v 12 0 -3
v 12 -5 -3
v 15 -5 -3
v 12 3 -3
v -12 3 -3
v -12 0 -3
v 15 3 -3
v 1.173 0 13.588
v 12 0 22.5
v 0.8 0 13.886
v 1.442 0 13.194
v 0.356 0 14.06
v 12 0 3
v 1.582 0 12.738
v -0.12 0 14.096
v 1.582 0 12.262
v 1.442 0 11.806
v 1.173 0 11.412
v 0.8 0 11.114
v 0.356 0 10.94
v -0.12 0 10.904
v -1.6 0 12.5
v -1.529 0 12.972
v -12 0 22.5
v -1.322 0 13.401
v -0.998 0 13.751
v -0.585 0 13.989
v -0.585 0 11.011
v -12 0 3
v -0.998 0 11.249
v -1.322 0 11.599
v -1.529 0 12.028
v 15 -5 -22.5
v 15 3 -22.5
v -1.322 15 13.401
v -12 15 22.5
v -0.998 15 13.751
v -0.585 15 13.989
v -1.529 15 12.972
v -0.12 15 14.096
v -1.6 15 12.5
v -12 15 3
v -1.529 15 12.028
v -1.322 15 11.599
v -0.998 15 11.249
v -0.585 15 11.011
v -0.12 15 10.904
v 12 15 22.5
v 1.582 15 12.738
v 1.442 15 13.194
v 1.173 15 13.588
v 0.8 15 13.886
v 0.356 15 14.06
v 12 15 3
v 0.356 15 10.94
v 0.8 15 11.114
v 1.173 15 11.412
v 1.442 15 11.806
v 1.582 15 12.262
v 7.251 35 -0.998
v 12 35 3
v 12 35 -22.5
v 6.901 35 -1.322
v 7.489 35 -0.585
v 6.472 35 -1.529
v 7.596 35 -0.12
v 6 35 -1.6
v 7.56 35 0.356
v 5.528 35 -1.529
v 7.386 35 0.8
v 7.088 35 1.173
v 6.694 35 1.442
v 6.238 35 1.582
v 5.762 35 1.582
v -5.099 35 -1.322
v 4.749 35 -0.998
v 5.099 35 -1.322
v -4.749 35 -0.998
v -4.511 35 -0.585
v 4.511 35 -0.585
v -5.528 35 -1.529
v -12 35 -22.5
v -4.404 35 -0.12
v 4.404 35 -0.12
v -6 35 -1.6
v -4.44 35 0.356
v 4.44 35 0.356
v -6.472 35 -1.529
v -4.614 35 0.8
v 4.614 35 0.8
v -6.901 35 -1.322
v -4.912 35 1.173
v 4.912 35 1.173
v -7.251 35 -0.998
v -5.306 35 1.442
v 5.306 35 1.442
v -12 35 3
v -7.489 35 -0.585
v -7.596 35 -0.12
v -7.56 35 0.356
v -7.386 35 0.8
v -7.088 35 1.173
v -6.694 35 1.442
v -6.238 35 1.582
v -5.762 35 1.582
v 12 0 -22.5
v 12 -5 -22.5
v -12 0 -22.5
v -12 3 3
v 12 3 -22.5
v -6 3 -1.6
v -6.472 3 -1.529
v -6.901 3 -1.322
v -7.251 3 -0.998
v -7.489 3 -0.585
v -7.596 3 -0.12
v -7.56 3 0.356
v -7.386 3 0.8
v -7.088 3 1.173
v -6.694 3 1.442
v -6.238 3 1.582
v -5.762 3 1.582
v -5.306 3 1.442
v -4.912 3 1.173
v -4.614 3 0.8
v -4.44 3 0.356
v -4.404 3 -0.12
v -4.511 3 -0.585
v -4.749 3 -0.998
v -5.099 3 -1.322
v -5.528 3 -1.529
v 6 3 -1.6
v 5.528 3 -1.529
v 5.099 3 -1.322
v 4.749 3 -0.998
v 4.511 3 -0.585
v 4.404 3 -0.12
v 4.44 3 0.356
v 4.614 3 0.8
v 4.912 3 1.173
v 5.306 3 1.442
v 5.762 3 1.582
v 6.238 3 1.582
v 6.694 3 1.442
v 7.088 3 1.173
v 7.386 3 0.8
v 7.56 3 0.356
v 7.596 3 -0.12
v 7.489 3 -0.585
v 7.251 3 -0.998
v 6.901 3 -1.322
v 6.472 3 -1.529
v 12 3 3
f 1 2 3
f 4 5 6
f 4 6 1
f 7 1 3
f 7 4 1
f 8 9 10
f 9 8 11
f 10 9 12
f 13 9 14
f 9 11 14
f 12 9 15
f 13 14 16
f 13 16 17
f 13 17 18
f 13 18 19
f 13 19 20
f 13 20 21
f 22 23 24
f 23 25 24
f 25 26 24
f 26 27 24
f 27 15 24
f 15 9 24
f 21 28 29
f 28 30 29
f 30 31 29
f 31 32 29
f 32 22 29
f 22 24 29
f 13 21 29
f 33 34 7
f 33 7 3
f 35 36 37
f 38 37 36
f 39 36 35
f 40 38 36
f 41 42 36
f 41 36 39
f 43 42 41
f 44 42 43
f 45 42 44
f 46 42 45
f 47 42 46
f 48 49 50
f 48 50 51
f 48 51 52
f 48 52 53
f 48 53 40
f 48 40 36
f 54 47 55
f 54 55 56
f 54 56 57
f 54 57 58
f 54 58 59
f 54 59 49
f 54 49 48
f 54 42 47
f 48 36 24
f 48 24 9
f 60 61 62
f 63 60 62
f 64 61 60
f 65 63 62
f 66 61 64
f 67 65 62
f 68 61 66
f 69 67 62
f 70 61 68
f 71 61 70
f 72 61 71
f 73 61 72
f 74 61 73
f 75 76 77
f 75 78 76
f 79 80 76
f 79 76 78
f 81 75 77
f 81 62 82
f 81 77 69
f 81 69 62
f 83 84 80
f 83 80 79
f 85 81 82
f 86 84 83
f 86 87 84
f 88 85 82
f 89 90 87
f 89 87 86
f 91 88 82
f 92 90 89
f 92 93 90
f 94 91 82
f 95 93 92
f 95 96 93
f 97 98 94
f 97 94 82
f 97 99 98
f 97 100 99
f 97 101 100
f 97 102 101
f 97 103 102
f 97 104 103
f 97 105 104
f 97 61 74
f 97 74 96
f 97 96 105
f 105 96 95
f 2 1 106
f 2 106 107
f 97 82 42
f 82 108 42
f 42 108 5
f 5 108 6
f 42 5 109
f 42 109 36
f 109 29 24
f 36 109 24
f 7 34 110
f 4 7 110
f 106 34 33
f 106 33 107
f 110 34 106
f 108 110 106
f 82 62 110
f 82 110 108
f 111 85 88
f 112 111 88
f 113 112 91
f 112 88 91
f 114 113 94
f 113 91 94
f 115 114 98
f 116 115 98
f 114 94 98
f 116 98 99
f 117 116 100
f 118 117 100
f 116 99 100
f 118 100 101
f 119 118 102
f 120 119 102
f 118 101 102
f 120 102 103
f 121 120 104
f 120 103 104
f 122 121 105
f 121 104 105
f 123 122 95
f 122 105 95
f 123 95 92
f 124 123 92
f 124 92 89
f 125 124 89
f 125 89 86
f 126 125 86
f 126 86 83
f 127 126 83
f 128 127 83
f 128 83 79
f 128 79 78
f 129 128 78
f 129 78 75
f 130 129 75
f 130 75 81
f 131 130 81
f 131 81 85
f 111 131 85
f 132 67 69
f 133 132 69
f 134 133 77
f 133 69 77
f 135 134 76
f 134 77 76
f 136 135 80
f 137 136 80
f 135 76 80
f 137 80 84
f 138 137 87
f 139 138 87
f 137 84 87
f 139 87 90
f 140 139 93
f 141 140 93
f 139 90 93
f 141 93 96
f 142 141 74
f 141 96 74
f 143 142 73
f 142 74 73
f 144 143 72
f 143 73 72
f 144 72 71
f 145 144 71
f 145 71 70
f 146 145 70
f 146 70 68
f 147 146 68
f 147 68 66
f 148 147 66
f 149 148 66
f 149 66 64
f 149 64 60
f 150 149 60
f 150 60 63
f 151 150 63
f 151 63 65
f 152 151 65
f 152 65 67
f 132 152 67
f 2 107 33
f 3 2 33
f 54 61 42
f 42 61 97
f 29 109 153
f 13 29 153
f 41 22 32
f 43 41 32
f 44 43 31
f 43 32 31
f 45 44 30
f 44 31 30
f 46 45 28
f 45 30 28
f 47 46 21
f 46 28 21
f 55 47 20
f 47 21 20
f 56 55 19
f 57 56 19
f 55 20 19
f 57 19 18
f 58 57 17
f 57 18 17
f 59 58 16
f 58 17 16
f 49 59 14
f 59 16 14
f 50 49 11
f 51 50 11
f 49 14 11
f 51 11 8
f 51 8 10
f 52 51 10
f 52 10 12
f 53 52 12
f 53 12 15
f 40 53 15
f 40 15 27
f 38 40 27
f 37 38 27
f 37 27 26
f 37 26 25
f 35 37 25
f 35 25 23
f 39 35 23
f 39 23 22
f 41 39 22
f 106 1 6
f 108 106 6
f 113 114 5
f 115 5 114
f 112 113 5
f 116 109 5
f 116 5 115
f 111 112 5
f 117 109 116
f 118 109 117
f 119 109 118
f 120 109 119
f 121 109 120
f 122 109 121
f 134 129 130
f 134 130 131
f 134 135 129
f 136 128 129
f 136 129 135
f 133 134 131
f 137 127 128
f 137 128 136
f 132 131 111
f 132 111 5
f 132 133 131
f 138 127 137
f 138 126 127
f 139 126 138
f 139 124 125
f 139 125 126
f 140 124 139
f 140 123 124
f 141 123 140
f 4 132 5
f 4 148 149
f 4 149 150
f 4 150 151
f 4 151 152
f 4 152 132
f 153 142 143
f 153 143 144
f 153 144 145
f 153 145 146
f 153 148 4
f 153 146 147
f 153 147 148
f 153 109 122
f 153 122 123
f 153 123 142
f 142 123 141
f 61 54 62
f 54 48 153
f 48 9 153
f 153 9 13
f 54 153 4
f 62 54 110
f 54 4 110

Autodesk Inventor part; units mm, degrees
ref_plane "YZ Plane" through (0, 0, 0) normal (1, 0, 0) x (0, 1, 0)
ref_plane "XZ Plane" through (0, 0, 0) normal (0, 1, 0) x (-1, 0, 0)
ref_plane "XY Plane" through (0, 0, 0) normal (0, 0, 1) x (1, 0, 0)
sketch "Sketch2" plane through (0, 0, 0) normal (0, 1, 0) x (-1, 0, 0)
  line L0 (12, 22.5) -> (-12, 22.5)
  line L1 (-12, 22.5) -> (-12, -22.5)
  line L2 (-12, -22.5) -> (12, -22.5)
  line L3 (12, -22.5) -> (12, 22.5)
  line L4 (12, 22.5) -> (12, 12.5)
  line L5 (12, 12.5) -> (0, 12.5)
  circle A0 centre (0, 12.5) radius 1.6
  line L6 (0, 12.5) -> (0, 0)
  line L7 (0, 0) -> (-6, 0)
  line L8 (-6, 0) -> (6, 0)
  circle A1 centre (-6, 0) radius 1.6
  circle A2 centre (6, 0) radius 1.6
  line L9 (-12, 22.5) -> (12, 22.5)
  line L10 (12, 22.5) -> (12, 0)
  line L11 (12, 0) -> (-12, 0)
  line L12 (-12, 0) -> (-12, 22.5)
  line L13 (-12, 22.5) -> (12, 22.5)
  line L14 (12, 22.5) -> (12, 2.2056)
  line L15 (12, 2.2056) -> (-12, 2.2056)
  line L16 (-12, 2.2056) -> (-12, 22.5)
  dimension "d0" = 24
  dimension "d1" = 45
  dimension "d2" = 10
  dimension "d3" = 3.2
  dimension "d6" = 6
  dimension "d7" = 3.2
  dimension "d8" = 3.2
extrude "Extrusion1" add sketch "Sketch2" along normal blind 35 contours L3 L5 A0 L6 L15 L1 L0 | L3 L15 L6 A0 L5 | L15 L6 L7 A1 L11 L1 | L3 L11 A2 L8 L6 L15 | L11 A1 L7 L8 A2 L3 L2 L1 | L11 L7 A1 | A1 L7 L11 | L11 L8 A2 | A2 L8 L11
sketch "Sketch3" plane through (0, 0, 0) normal (0, -1, 0) x (1, 0, 0)
  line L0 (12, 22.5) -> (12, -22.5) projected
  line L1 (-12, -22.5) -> (-12, 22.5) projected
  line L2 (12, 3) -> (-12, 3)
  line L3 (-12, 3) -> (-12, -3)
  line L4 (-12, -3) -> (12, -3)
  line L5 (12, -3) -> (12, 3)
  point P0 (0, 0)
  dimension "d9" = 6
extrude "Extrusion2" cut sketch "Sketch3" against normal blind 3
hole "Hole1" at (-6, 0, 0) at (6, 0, 0) direction (0, 1, 0) diameter 3.2 depth 44.75 countersink diameter 4 countersink angle 90
sketch "Sketch4" plane through (0, 35, 0) normal (0, 1, 0) x (1, 0, 0)
  line L0 (12, -3) -> (12, 3) projected
  line L1 (-12, -22.5) -> (12, -22.5)
  line L2 (12, -22.5) -> (12, -3)
  line L3 (12, -3) -> (-12, -3)
  line L4 (-12, -3) -> (-12, -22.5)
  point P0 (0, 0)
extrude "Extrusion3" cut sketch "Sketch4" against normal blind 20
sketch "Sketch5" plane through (12, 0, -22.5) normal (1, 0, 0) x (0, 0, -1)
  line L0 (-45, 0) -> (-25.5, 0) projected
  line L1 (-45, 0) -> (-45, 15) projected
  line L2 (-25.5, 0) -> (-45, 0)
  line L3 (-45, 0) -> (-45, 3)
  line L4 (-45, 3) -> (-25.5, 3)
  line L5 (-25.5, 3) -> (-25.5, 0)
  point P0 (-22.5, 0)
  dimension "d21" = 3
extrude "Extrusion4" add sketch "Sketch5" along normal blind 3
sketch "Sketch6" plane through (0, 0, 0) normal (0, -1, 0) x (1, 0, 0)
  line L0 (-12, 3) -> (15, 3) projected
  line L1 (12, 22.5) -> (12, 3) projected
  line L2 (15, 3) -> (12, 3)
  line L3 (12, 3) -> (12, 22.5)
  line L4 (12, 22.5) -> (15, 22.5)
  line L5 (15, 22.5) -> (15, 3)
  point P0 (0, 0)
extrude "Extrusion5" add sketch "Sketch6" along normal blind 5
sketch "Sketch7" plane through (-12, 0, 3) normal (0, 0, -1) x (-1, 0, 0)
  line L0 (-24, 0) -> (-24, -5) projected
  line L1 (-27, 3) -> (-27, -5) projected
  line L2 (-24, -5) -> (-27, -5)
  line L3 (-27, -5) -> (-27, 3)
  line L4 (-27, 3) -> (-24, 3)
  line L5 (-24, 3) -> (-24, -5)
  point P0 (-12, 0)
extrude "Extrusion6" add sketch "Sketch7" along normal blind 25.5
sketch "Sketch8" plane through (-12, 15, 22.5) normal (0, 0, 1) x (1, 0, 0)
  line L0 (27, -12) -> (27, -20) projected
  line L1 (24, -12) -> (24, -15) projected
  line L2 (27, -20) -> (24, -20)
  line L3 (24, -20) -> (24, -12)
  line L4 (24, -12) -> (27, -12)
  line L5 (27, -12) -> (27, -20)
  point P0 (12, -15)
extrude "Extrusion7" cut sketch "Sketch8" against normal blind 25.5
properties part number "spoutstandsupport"
